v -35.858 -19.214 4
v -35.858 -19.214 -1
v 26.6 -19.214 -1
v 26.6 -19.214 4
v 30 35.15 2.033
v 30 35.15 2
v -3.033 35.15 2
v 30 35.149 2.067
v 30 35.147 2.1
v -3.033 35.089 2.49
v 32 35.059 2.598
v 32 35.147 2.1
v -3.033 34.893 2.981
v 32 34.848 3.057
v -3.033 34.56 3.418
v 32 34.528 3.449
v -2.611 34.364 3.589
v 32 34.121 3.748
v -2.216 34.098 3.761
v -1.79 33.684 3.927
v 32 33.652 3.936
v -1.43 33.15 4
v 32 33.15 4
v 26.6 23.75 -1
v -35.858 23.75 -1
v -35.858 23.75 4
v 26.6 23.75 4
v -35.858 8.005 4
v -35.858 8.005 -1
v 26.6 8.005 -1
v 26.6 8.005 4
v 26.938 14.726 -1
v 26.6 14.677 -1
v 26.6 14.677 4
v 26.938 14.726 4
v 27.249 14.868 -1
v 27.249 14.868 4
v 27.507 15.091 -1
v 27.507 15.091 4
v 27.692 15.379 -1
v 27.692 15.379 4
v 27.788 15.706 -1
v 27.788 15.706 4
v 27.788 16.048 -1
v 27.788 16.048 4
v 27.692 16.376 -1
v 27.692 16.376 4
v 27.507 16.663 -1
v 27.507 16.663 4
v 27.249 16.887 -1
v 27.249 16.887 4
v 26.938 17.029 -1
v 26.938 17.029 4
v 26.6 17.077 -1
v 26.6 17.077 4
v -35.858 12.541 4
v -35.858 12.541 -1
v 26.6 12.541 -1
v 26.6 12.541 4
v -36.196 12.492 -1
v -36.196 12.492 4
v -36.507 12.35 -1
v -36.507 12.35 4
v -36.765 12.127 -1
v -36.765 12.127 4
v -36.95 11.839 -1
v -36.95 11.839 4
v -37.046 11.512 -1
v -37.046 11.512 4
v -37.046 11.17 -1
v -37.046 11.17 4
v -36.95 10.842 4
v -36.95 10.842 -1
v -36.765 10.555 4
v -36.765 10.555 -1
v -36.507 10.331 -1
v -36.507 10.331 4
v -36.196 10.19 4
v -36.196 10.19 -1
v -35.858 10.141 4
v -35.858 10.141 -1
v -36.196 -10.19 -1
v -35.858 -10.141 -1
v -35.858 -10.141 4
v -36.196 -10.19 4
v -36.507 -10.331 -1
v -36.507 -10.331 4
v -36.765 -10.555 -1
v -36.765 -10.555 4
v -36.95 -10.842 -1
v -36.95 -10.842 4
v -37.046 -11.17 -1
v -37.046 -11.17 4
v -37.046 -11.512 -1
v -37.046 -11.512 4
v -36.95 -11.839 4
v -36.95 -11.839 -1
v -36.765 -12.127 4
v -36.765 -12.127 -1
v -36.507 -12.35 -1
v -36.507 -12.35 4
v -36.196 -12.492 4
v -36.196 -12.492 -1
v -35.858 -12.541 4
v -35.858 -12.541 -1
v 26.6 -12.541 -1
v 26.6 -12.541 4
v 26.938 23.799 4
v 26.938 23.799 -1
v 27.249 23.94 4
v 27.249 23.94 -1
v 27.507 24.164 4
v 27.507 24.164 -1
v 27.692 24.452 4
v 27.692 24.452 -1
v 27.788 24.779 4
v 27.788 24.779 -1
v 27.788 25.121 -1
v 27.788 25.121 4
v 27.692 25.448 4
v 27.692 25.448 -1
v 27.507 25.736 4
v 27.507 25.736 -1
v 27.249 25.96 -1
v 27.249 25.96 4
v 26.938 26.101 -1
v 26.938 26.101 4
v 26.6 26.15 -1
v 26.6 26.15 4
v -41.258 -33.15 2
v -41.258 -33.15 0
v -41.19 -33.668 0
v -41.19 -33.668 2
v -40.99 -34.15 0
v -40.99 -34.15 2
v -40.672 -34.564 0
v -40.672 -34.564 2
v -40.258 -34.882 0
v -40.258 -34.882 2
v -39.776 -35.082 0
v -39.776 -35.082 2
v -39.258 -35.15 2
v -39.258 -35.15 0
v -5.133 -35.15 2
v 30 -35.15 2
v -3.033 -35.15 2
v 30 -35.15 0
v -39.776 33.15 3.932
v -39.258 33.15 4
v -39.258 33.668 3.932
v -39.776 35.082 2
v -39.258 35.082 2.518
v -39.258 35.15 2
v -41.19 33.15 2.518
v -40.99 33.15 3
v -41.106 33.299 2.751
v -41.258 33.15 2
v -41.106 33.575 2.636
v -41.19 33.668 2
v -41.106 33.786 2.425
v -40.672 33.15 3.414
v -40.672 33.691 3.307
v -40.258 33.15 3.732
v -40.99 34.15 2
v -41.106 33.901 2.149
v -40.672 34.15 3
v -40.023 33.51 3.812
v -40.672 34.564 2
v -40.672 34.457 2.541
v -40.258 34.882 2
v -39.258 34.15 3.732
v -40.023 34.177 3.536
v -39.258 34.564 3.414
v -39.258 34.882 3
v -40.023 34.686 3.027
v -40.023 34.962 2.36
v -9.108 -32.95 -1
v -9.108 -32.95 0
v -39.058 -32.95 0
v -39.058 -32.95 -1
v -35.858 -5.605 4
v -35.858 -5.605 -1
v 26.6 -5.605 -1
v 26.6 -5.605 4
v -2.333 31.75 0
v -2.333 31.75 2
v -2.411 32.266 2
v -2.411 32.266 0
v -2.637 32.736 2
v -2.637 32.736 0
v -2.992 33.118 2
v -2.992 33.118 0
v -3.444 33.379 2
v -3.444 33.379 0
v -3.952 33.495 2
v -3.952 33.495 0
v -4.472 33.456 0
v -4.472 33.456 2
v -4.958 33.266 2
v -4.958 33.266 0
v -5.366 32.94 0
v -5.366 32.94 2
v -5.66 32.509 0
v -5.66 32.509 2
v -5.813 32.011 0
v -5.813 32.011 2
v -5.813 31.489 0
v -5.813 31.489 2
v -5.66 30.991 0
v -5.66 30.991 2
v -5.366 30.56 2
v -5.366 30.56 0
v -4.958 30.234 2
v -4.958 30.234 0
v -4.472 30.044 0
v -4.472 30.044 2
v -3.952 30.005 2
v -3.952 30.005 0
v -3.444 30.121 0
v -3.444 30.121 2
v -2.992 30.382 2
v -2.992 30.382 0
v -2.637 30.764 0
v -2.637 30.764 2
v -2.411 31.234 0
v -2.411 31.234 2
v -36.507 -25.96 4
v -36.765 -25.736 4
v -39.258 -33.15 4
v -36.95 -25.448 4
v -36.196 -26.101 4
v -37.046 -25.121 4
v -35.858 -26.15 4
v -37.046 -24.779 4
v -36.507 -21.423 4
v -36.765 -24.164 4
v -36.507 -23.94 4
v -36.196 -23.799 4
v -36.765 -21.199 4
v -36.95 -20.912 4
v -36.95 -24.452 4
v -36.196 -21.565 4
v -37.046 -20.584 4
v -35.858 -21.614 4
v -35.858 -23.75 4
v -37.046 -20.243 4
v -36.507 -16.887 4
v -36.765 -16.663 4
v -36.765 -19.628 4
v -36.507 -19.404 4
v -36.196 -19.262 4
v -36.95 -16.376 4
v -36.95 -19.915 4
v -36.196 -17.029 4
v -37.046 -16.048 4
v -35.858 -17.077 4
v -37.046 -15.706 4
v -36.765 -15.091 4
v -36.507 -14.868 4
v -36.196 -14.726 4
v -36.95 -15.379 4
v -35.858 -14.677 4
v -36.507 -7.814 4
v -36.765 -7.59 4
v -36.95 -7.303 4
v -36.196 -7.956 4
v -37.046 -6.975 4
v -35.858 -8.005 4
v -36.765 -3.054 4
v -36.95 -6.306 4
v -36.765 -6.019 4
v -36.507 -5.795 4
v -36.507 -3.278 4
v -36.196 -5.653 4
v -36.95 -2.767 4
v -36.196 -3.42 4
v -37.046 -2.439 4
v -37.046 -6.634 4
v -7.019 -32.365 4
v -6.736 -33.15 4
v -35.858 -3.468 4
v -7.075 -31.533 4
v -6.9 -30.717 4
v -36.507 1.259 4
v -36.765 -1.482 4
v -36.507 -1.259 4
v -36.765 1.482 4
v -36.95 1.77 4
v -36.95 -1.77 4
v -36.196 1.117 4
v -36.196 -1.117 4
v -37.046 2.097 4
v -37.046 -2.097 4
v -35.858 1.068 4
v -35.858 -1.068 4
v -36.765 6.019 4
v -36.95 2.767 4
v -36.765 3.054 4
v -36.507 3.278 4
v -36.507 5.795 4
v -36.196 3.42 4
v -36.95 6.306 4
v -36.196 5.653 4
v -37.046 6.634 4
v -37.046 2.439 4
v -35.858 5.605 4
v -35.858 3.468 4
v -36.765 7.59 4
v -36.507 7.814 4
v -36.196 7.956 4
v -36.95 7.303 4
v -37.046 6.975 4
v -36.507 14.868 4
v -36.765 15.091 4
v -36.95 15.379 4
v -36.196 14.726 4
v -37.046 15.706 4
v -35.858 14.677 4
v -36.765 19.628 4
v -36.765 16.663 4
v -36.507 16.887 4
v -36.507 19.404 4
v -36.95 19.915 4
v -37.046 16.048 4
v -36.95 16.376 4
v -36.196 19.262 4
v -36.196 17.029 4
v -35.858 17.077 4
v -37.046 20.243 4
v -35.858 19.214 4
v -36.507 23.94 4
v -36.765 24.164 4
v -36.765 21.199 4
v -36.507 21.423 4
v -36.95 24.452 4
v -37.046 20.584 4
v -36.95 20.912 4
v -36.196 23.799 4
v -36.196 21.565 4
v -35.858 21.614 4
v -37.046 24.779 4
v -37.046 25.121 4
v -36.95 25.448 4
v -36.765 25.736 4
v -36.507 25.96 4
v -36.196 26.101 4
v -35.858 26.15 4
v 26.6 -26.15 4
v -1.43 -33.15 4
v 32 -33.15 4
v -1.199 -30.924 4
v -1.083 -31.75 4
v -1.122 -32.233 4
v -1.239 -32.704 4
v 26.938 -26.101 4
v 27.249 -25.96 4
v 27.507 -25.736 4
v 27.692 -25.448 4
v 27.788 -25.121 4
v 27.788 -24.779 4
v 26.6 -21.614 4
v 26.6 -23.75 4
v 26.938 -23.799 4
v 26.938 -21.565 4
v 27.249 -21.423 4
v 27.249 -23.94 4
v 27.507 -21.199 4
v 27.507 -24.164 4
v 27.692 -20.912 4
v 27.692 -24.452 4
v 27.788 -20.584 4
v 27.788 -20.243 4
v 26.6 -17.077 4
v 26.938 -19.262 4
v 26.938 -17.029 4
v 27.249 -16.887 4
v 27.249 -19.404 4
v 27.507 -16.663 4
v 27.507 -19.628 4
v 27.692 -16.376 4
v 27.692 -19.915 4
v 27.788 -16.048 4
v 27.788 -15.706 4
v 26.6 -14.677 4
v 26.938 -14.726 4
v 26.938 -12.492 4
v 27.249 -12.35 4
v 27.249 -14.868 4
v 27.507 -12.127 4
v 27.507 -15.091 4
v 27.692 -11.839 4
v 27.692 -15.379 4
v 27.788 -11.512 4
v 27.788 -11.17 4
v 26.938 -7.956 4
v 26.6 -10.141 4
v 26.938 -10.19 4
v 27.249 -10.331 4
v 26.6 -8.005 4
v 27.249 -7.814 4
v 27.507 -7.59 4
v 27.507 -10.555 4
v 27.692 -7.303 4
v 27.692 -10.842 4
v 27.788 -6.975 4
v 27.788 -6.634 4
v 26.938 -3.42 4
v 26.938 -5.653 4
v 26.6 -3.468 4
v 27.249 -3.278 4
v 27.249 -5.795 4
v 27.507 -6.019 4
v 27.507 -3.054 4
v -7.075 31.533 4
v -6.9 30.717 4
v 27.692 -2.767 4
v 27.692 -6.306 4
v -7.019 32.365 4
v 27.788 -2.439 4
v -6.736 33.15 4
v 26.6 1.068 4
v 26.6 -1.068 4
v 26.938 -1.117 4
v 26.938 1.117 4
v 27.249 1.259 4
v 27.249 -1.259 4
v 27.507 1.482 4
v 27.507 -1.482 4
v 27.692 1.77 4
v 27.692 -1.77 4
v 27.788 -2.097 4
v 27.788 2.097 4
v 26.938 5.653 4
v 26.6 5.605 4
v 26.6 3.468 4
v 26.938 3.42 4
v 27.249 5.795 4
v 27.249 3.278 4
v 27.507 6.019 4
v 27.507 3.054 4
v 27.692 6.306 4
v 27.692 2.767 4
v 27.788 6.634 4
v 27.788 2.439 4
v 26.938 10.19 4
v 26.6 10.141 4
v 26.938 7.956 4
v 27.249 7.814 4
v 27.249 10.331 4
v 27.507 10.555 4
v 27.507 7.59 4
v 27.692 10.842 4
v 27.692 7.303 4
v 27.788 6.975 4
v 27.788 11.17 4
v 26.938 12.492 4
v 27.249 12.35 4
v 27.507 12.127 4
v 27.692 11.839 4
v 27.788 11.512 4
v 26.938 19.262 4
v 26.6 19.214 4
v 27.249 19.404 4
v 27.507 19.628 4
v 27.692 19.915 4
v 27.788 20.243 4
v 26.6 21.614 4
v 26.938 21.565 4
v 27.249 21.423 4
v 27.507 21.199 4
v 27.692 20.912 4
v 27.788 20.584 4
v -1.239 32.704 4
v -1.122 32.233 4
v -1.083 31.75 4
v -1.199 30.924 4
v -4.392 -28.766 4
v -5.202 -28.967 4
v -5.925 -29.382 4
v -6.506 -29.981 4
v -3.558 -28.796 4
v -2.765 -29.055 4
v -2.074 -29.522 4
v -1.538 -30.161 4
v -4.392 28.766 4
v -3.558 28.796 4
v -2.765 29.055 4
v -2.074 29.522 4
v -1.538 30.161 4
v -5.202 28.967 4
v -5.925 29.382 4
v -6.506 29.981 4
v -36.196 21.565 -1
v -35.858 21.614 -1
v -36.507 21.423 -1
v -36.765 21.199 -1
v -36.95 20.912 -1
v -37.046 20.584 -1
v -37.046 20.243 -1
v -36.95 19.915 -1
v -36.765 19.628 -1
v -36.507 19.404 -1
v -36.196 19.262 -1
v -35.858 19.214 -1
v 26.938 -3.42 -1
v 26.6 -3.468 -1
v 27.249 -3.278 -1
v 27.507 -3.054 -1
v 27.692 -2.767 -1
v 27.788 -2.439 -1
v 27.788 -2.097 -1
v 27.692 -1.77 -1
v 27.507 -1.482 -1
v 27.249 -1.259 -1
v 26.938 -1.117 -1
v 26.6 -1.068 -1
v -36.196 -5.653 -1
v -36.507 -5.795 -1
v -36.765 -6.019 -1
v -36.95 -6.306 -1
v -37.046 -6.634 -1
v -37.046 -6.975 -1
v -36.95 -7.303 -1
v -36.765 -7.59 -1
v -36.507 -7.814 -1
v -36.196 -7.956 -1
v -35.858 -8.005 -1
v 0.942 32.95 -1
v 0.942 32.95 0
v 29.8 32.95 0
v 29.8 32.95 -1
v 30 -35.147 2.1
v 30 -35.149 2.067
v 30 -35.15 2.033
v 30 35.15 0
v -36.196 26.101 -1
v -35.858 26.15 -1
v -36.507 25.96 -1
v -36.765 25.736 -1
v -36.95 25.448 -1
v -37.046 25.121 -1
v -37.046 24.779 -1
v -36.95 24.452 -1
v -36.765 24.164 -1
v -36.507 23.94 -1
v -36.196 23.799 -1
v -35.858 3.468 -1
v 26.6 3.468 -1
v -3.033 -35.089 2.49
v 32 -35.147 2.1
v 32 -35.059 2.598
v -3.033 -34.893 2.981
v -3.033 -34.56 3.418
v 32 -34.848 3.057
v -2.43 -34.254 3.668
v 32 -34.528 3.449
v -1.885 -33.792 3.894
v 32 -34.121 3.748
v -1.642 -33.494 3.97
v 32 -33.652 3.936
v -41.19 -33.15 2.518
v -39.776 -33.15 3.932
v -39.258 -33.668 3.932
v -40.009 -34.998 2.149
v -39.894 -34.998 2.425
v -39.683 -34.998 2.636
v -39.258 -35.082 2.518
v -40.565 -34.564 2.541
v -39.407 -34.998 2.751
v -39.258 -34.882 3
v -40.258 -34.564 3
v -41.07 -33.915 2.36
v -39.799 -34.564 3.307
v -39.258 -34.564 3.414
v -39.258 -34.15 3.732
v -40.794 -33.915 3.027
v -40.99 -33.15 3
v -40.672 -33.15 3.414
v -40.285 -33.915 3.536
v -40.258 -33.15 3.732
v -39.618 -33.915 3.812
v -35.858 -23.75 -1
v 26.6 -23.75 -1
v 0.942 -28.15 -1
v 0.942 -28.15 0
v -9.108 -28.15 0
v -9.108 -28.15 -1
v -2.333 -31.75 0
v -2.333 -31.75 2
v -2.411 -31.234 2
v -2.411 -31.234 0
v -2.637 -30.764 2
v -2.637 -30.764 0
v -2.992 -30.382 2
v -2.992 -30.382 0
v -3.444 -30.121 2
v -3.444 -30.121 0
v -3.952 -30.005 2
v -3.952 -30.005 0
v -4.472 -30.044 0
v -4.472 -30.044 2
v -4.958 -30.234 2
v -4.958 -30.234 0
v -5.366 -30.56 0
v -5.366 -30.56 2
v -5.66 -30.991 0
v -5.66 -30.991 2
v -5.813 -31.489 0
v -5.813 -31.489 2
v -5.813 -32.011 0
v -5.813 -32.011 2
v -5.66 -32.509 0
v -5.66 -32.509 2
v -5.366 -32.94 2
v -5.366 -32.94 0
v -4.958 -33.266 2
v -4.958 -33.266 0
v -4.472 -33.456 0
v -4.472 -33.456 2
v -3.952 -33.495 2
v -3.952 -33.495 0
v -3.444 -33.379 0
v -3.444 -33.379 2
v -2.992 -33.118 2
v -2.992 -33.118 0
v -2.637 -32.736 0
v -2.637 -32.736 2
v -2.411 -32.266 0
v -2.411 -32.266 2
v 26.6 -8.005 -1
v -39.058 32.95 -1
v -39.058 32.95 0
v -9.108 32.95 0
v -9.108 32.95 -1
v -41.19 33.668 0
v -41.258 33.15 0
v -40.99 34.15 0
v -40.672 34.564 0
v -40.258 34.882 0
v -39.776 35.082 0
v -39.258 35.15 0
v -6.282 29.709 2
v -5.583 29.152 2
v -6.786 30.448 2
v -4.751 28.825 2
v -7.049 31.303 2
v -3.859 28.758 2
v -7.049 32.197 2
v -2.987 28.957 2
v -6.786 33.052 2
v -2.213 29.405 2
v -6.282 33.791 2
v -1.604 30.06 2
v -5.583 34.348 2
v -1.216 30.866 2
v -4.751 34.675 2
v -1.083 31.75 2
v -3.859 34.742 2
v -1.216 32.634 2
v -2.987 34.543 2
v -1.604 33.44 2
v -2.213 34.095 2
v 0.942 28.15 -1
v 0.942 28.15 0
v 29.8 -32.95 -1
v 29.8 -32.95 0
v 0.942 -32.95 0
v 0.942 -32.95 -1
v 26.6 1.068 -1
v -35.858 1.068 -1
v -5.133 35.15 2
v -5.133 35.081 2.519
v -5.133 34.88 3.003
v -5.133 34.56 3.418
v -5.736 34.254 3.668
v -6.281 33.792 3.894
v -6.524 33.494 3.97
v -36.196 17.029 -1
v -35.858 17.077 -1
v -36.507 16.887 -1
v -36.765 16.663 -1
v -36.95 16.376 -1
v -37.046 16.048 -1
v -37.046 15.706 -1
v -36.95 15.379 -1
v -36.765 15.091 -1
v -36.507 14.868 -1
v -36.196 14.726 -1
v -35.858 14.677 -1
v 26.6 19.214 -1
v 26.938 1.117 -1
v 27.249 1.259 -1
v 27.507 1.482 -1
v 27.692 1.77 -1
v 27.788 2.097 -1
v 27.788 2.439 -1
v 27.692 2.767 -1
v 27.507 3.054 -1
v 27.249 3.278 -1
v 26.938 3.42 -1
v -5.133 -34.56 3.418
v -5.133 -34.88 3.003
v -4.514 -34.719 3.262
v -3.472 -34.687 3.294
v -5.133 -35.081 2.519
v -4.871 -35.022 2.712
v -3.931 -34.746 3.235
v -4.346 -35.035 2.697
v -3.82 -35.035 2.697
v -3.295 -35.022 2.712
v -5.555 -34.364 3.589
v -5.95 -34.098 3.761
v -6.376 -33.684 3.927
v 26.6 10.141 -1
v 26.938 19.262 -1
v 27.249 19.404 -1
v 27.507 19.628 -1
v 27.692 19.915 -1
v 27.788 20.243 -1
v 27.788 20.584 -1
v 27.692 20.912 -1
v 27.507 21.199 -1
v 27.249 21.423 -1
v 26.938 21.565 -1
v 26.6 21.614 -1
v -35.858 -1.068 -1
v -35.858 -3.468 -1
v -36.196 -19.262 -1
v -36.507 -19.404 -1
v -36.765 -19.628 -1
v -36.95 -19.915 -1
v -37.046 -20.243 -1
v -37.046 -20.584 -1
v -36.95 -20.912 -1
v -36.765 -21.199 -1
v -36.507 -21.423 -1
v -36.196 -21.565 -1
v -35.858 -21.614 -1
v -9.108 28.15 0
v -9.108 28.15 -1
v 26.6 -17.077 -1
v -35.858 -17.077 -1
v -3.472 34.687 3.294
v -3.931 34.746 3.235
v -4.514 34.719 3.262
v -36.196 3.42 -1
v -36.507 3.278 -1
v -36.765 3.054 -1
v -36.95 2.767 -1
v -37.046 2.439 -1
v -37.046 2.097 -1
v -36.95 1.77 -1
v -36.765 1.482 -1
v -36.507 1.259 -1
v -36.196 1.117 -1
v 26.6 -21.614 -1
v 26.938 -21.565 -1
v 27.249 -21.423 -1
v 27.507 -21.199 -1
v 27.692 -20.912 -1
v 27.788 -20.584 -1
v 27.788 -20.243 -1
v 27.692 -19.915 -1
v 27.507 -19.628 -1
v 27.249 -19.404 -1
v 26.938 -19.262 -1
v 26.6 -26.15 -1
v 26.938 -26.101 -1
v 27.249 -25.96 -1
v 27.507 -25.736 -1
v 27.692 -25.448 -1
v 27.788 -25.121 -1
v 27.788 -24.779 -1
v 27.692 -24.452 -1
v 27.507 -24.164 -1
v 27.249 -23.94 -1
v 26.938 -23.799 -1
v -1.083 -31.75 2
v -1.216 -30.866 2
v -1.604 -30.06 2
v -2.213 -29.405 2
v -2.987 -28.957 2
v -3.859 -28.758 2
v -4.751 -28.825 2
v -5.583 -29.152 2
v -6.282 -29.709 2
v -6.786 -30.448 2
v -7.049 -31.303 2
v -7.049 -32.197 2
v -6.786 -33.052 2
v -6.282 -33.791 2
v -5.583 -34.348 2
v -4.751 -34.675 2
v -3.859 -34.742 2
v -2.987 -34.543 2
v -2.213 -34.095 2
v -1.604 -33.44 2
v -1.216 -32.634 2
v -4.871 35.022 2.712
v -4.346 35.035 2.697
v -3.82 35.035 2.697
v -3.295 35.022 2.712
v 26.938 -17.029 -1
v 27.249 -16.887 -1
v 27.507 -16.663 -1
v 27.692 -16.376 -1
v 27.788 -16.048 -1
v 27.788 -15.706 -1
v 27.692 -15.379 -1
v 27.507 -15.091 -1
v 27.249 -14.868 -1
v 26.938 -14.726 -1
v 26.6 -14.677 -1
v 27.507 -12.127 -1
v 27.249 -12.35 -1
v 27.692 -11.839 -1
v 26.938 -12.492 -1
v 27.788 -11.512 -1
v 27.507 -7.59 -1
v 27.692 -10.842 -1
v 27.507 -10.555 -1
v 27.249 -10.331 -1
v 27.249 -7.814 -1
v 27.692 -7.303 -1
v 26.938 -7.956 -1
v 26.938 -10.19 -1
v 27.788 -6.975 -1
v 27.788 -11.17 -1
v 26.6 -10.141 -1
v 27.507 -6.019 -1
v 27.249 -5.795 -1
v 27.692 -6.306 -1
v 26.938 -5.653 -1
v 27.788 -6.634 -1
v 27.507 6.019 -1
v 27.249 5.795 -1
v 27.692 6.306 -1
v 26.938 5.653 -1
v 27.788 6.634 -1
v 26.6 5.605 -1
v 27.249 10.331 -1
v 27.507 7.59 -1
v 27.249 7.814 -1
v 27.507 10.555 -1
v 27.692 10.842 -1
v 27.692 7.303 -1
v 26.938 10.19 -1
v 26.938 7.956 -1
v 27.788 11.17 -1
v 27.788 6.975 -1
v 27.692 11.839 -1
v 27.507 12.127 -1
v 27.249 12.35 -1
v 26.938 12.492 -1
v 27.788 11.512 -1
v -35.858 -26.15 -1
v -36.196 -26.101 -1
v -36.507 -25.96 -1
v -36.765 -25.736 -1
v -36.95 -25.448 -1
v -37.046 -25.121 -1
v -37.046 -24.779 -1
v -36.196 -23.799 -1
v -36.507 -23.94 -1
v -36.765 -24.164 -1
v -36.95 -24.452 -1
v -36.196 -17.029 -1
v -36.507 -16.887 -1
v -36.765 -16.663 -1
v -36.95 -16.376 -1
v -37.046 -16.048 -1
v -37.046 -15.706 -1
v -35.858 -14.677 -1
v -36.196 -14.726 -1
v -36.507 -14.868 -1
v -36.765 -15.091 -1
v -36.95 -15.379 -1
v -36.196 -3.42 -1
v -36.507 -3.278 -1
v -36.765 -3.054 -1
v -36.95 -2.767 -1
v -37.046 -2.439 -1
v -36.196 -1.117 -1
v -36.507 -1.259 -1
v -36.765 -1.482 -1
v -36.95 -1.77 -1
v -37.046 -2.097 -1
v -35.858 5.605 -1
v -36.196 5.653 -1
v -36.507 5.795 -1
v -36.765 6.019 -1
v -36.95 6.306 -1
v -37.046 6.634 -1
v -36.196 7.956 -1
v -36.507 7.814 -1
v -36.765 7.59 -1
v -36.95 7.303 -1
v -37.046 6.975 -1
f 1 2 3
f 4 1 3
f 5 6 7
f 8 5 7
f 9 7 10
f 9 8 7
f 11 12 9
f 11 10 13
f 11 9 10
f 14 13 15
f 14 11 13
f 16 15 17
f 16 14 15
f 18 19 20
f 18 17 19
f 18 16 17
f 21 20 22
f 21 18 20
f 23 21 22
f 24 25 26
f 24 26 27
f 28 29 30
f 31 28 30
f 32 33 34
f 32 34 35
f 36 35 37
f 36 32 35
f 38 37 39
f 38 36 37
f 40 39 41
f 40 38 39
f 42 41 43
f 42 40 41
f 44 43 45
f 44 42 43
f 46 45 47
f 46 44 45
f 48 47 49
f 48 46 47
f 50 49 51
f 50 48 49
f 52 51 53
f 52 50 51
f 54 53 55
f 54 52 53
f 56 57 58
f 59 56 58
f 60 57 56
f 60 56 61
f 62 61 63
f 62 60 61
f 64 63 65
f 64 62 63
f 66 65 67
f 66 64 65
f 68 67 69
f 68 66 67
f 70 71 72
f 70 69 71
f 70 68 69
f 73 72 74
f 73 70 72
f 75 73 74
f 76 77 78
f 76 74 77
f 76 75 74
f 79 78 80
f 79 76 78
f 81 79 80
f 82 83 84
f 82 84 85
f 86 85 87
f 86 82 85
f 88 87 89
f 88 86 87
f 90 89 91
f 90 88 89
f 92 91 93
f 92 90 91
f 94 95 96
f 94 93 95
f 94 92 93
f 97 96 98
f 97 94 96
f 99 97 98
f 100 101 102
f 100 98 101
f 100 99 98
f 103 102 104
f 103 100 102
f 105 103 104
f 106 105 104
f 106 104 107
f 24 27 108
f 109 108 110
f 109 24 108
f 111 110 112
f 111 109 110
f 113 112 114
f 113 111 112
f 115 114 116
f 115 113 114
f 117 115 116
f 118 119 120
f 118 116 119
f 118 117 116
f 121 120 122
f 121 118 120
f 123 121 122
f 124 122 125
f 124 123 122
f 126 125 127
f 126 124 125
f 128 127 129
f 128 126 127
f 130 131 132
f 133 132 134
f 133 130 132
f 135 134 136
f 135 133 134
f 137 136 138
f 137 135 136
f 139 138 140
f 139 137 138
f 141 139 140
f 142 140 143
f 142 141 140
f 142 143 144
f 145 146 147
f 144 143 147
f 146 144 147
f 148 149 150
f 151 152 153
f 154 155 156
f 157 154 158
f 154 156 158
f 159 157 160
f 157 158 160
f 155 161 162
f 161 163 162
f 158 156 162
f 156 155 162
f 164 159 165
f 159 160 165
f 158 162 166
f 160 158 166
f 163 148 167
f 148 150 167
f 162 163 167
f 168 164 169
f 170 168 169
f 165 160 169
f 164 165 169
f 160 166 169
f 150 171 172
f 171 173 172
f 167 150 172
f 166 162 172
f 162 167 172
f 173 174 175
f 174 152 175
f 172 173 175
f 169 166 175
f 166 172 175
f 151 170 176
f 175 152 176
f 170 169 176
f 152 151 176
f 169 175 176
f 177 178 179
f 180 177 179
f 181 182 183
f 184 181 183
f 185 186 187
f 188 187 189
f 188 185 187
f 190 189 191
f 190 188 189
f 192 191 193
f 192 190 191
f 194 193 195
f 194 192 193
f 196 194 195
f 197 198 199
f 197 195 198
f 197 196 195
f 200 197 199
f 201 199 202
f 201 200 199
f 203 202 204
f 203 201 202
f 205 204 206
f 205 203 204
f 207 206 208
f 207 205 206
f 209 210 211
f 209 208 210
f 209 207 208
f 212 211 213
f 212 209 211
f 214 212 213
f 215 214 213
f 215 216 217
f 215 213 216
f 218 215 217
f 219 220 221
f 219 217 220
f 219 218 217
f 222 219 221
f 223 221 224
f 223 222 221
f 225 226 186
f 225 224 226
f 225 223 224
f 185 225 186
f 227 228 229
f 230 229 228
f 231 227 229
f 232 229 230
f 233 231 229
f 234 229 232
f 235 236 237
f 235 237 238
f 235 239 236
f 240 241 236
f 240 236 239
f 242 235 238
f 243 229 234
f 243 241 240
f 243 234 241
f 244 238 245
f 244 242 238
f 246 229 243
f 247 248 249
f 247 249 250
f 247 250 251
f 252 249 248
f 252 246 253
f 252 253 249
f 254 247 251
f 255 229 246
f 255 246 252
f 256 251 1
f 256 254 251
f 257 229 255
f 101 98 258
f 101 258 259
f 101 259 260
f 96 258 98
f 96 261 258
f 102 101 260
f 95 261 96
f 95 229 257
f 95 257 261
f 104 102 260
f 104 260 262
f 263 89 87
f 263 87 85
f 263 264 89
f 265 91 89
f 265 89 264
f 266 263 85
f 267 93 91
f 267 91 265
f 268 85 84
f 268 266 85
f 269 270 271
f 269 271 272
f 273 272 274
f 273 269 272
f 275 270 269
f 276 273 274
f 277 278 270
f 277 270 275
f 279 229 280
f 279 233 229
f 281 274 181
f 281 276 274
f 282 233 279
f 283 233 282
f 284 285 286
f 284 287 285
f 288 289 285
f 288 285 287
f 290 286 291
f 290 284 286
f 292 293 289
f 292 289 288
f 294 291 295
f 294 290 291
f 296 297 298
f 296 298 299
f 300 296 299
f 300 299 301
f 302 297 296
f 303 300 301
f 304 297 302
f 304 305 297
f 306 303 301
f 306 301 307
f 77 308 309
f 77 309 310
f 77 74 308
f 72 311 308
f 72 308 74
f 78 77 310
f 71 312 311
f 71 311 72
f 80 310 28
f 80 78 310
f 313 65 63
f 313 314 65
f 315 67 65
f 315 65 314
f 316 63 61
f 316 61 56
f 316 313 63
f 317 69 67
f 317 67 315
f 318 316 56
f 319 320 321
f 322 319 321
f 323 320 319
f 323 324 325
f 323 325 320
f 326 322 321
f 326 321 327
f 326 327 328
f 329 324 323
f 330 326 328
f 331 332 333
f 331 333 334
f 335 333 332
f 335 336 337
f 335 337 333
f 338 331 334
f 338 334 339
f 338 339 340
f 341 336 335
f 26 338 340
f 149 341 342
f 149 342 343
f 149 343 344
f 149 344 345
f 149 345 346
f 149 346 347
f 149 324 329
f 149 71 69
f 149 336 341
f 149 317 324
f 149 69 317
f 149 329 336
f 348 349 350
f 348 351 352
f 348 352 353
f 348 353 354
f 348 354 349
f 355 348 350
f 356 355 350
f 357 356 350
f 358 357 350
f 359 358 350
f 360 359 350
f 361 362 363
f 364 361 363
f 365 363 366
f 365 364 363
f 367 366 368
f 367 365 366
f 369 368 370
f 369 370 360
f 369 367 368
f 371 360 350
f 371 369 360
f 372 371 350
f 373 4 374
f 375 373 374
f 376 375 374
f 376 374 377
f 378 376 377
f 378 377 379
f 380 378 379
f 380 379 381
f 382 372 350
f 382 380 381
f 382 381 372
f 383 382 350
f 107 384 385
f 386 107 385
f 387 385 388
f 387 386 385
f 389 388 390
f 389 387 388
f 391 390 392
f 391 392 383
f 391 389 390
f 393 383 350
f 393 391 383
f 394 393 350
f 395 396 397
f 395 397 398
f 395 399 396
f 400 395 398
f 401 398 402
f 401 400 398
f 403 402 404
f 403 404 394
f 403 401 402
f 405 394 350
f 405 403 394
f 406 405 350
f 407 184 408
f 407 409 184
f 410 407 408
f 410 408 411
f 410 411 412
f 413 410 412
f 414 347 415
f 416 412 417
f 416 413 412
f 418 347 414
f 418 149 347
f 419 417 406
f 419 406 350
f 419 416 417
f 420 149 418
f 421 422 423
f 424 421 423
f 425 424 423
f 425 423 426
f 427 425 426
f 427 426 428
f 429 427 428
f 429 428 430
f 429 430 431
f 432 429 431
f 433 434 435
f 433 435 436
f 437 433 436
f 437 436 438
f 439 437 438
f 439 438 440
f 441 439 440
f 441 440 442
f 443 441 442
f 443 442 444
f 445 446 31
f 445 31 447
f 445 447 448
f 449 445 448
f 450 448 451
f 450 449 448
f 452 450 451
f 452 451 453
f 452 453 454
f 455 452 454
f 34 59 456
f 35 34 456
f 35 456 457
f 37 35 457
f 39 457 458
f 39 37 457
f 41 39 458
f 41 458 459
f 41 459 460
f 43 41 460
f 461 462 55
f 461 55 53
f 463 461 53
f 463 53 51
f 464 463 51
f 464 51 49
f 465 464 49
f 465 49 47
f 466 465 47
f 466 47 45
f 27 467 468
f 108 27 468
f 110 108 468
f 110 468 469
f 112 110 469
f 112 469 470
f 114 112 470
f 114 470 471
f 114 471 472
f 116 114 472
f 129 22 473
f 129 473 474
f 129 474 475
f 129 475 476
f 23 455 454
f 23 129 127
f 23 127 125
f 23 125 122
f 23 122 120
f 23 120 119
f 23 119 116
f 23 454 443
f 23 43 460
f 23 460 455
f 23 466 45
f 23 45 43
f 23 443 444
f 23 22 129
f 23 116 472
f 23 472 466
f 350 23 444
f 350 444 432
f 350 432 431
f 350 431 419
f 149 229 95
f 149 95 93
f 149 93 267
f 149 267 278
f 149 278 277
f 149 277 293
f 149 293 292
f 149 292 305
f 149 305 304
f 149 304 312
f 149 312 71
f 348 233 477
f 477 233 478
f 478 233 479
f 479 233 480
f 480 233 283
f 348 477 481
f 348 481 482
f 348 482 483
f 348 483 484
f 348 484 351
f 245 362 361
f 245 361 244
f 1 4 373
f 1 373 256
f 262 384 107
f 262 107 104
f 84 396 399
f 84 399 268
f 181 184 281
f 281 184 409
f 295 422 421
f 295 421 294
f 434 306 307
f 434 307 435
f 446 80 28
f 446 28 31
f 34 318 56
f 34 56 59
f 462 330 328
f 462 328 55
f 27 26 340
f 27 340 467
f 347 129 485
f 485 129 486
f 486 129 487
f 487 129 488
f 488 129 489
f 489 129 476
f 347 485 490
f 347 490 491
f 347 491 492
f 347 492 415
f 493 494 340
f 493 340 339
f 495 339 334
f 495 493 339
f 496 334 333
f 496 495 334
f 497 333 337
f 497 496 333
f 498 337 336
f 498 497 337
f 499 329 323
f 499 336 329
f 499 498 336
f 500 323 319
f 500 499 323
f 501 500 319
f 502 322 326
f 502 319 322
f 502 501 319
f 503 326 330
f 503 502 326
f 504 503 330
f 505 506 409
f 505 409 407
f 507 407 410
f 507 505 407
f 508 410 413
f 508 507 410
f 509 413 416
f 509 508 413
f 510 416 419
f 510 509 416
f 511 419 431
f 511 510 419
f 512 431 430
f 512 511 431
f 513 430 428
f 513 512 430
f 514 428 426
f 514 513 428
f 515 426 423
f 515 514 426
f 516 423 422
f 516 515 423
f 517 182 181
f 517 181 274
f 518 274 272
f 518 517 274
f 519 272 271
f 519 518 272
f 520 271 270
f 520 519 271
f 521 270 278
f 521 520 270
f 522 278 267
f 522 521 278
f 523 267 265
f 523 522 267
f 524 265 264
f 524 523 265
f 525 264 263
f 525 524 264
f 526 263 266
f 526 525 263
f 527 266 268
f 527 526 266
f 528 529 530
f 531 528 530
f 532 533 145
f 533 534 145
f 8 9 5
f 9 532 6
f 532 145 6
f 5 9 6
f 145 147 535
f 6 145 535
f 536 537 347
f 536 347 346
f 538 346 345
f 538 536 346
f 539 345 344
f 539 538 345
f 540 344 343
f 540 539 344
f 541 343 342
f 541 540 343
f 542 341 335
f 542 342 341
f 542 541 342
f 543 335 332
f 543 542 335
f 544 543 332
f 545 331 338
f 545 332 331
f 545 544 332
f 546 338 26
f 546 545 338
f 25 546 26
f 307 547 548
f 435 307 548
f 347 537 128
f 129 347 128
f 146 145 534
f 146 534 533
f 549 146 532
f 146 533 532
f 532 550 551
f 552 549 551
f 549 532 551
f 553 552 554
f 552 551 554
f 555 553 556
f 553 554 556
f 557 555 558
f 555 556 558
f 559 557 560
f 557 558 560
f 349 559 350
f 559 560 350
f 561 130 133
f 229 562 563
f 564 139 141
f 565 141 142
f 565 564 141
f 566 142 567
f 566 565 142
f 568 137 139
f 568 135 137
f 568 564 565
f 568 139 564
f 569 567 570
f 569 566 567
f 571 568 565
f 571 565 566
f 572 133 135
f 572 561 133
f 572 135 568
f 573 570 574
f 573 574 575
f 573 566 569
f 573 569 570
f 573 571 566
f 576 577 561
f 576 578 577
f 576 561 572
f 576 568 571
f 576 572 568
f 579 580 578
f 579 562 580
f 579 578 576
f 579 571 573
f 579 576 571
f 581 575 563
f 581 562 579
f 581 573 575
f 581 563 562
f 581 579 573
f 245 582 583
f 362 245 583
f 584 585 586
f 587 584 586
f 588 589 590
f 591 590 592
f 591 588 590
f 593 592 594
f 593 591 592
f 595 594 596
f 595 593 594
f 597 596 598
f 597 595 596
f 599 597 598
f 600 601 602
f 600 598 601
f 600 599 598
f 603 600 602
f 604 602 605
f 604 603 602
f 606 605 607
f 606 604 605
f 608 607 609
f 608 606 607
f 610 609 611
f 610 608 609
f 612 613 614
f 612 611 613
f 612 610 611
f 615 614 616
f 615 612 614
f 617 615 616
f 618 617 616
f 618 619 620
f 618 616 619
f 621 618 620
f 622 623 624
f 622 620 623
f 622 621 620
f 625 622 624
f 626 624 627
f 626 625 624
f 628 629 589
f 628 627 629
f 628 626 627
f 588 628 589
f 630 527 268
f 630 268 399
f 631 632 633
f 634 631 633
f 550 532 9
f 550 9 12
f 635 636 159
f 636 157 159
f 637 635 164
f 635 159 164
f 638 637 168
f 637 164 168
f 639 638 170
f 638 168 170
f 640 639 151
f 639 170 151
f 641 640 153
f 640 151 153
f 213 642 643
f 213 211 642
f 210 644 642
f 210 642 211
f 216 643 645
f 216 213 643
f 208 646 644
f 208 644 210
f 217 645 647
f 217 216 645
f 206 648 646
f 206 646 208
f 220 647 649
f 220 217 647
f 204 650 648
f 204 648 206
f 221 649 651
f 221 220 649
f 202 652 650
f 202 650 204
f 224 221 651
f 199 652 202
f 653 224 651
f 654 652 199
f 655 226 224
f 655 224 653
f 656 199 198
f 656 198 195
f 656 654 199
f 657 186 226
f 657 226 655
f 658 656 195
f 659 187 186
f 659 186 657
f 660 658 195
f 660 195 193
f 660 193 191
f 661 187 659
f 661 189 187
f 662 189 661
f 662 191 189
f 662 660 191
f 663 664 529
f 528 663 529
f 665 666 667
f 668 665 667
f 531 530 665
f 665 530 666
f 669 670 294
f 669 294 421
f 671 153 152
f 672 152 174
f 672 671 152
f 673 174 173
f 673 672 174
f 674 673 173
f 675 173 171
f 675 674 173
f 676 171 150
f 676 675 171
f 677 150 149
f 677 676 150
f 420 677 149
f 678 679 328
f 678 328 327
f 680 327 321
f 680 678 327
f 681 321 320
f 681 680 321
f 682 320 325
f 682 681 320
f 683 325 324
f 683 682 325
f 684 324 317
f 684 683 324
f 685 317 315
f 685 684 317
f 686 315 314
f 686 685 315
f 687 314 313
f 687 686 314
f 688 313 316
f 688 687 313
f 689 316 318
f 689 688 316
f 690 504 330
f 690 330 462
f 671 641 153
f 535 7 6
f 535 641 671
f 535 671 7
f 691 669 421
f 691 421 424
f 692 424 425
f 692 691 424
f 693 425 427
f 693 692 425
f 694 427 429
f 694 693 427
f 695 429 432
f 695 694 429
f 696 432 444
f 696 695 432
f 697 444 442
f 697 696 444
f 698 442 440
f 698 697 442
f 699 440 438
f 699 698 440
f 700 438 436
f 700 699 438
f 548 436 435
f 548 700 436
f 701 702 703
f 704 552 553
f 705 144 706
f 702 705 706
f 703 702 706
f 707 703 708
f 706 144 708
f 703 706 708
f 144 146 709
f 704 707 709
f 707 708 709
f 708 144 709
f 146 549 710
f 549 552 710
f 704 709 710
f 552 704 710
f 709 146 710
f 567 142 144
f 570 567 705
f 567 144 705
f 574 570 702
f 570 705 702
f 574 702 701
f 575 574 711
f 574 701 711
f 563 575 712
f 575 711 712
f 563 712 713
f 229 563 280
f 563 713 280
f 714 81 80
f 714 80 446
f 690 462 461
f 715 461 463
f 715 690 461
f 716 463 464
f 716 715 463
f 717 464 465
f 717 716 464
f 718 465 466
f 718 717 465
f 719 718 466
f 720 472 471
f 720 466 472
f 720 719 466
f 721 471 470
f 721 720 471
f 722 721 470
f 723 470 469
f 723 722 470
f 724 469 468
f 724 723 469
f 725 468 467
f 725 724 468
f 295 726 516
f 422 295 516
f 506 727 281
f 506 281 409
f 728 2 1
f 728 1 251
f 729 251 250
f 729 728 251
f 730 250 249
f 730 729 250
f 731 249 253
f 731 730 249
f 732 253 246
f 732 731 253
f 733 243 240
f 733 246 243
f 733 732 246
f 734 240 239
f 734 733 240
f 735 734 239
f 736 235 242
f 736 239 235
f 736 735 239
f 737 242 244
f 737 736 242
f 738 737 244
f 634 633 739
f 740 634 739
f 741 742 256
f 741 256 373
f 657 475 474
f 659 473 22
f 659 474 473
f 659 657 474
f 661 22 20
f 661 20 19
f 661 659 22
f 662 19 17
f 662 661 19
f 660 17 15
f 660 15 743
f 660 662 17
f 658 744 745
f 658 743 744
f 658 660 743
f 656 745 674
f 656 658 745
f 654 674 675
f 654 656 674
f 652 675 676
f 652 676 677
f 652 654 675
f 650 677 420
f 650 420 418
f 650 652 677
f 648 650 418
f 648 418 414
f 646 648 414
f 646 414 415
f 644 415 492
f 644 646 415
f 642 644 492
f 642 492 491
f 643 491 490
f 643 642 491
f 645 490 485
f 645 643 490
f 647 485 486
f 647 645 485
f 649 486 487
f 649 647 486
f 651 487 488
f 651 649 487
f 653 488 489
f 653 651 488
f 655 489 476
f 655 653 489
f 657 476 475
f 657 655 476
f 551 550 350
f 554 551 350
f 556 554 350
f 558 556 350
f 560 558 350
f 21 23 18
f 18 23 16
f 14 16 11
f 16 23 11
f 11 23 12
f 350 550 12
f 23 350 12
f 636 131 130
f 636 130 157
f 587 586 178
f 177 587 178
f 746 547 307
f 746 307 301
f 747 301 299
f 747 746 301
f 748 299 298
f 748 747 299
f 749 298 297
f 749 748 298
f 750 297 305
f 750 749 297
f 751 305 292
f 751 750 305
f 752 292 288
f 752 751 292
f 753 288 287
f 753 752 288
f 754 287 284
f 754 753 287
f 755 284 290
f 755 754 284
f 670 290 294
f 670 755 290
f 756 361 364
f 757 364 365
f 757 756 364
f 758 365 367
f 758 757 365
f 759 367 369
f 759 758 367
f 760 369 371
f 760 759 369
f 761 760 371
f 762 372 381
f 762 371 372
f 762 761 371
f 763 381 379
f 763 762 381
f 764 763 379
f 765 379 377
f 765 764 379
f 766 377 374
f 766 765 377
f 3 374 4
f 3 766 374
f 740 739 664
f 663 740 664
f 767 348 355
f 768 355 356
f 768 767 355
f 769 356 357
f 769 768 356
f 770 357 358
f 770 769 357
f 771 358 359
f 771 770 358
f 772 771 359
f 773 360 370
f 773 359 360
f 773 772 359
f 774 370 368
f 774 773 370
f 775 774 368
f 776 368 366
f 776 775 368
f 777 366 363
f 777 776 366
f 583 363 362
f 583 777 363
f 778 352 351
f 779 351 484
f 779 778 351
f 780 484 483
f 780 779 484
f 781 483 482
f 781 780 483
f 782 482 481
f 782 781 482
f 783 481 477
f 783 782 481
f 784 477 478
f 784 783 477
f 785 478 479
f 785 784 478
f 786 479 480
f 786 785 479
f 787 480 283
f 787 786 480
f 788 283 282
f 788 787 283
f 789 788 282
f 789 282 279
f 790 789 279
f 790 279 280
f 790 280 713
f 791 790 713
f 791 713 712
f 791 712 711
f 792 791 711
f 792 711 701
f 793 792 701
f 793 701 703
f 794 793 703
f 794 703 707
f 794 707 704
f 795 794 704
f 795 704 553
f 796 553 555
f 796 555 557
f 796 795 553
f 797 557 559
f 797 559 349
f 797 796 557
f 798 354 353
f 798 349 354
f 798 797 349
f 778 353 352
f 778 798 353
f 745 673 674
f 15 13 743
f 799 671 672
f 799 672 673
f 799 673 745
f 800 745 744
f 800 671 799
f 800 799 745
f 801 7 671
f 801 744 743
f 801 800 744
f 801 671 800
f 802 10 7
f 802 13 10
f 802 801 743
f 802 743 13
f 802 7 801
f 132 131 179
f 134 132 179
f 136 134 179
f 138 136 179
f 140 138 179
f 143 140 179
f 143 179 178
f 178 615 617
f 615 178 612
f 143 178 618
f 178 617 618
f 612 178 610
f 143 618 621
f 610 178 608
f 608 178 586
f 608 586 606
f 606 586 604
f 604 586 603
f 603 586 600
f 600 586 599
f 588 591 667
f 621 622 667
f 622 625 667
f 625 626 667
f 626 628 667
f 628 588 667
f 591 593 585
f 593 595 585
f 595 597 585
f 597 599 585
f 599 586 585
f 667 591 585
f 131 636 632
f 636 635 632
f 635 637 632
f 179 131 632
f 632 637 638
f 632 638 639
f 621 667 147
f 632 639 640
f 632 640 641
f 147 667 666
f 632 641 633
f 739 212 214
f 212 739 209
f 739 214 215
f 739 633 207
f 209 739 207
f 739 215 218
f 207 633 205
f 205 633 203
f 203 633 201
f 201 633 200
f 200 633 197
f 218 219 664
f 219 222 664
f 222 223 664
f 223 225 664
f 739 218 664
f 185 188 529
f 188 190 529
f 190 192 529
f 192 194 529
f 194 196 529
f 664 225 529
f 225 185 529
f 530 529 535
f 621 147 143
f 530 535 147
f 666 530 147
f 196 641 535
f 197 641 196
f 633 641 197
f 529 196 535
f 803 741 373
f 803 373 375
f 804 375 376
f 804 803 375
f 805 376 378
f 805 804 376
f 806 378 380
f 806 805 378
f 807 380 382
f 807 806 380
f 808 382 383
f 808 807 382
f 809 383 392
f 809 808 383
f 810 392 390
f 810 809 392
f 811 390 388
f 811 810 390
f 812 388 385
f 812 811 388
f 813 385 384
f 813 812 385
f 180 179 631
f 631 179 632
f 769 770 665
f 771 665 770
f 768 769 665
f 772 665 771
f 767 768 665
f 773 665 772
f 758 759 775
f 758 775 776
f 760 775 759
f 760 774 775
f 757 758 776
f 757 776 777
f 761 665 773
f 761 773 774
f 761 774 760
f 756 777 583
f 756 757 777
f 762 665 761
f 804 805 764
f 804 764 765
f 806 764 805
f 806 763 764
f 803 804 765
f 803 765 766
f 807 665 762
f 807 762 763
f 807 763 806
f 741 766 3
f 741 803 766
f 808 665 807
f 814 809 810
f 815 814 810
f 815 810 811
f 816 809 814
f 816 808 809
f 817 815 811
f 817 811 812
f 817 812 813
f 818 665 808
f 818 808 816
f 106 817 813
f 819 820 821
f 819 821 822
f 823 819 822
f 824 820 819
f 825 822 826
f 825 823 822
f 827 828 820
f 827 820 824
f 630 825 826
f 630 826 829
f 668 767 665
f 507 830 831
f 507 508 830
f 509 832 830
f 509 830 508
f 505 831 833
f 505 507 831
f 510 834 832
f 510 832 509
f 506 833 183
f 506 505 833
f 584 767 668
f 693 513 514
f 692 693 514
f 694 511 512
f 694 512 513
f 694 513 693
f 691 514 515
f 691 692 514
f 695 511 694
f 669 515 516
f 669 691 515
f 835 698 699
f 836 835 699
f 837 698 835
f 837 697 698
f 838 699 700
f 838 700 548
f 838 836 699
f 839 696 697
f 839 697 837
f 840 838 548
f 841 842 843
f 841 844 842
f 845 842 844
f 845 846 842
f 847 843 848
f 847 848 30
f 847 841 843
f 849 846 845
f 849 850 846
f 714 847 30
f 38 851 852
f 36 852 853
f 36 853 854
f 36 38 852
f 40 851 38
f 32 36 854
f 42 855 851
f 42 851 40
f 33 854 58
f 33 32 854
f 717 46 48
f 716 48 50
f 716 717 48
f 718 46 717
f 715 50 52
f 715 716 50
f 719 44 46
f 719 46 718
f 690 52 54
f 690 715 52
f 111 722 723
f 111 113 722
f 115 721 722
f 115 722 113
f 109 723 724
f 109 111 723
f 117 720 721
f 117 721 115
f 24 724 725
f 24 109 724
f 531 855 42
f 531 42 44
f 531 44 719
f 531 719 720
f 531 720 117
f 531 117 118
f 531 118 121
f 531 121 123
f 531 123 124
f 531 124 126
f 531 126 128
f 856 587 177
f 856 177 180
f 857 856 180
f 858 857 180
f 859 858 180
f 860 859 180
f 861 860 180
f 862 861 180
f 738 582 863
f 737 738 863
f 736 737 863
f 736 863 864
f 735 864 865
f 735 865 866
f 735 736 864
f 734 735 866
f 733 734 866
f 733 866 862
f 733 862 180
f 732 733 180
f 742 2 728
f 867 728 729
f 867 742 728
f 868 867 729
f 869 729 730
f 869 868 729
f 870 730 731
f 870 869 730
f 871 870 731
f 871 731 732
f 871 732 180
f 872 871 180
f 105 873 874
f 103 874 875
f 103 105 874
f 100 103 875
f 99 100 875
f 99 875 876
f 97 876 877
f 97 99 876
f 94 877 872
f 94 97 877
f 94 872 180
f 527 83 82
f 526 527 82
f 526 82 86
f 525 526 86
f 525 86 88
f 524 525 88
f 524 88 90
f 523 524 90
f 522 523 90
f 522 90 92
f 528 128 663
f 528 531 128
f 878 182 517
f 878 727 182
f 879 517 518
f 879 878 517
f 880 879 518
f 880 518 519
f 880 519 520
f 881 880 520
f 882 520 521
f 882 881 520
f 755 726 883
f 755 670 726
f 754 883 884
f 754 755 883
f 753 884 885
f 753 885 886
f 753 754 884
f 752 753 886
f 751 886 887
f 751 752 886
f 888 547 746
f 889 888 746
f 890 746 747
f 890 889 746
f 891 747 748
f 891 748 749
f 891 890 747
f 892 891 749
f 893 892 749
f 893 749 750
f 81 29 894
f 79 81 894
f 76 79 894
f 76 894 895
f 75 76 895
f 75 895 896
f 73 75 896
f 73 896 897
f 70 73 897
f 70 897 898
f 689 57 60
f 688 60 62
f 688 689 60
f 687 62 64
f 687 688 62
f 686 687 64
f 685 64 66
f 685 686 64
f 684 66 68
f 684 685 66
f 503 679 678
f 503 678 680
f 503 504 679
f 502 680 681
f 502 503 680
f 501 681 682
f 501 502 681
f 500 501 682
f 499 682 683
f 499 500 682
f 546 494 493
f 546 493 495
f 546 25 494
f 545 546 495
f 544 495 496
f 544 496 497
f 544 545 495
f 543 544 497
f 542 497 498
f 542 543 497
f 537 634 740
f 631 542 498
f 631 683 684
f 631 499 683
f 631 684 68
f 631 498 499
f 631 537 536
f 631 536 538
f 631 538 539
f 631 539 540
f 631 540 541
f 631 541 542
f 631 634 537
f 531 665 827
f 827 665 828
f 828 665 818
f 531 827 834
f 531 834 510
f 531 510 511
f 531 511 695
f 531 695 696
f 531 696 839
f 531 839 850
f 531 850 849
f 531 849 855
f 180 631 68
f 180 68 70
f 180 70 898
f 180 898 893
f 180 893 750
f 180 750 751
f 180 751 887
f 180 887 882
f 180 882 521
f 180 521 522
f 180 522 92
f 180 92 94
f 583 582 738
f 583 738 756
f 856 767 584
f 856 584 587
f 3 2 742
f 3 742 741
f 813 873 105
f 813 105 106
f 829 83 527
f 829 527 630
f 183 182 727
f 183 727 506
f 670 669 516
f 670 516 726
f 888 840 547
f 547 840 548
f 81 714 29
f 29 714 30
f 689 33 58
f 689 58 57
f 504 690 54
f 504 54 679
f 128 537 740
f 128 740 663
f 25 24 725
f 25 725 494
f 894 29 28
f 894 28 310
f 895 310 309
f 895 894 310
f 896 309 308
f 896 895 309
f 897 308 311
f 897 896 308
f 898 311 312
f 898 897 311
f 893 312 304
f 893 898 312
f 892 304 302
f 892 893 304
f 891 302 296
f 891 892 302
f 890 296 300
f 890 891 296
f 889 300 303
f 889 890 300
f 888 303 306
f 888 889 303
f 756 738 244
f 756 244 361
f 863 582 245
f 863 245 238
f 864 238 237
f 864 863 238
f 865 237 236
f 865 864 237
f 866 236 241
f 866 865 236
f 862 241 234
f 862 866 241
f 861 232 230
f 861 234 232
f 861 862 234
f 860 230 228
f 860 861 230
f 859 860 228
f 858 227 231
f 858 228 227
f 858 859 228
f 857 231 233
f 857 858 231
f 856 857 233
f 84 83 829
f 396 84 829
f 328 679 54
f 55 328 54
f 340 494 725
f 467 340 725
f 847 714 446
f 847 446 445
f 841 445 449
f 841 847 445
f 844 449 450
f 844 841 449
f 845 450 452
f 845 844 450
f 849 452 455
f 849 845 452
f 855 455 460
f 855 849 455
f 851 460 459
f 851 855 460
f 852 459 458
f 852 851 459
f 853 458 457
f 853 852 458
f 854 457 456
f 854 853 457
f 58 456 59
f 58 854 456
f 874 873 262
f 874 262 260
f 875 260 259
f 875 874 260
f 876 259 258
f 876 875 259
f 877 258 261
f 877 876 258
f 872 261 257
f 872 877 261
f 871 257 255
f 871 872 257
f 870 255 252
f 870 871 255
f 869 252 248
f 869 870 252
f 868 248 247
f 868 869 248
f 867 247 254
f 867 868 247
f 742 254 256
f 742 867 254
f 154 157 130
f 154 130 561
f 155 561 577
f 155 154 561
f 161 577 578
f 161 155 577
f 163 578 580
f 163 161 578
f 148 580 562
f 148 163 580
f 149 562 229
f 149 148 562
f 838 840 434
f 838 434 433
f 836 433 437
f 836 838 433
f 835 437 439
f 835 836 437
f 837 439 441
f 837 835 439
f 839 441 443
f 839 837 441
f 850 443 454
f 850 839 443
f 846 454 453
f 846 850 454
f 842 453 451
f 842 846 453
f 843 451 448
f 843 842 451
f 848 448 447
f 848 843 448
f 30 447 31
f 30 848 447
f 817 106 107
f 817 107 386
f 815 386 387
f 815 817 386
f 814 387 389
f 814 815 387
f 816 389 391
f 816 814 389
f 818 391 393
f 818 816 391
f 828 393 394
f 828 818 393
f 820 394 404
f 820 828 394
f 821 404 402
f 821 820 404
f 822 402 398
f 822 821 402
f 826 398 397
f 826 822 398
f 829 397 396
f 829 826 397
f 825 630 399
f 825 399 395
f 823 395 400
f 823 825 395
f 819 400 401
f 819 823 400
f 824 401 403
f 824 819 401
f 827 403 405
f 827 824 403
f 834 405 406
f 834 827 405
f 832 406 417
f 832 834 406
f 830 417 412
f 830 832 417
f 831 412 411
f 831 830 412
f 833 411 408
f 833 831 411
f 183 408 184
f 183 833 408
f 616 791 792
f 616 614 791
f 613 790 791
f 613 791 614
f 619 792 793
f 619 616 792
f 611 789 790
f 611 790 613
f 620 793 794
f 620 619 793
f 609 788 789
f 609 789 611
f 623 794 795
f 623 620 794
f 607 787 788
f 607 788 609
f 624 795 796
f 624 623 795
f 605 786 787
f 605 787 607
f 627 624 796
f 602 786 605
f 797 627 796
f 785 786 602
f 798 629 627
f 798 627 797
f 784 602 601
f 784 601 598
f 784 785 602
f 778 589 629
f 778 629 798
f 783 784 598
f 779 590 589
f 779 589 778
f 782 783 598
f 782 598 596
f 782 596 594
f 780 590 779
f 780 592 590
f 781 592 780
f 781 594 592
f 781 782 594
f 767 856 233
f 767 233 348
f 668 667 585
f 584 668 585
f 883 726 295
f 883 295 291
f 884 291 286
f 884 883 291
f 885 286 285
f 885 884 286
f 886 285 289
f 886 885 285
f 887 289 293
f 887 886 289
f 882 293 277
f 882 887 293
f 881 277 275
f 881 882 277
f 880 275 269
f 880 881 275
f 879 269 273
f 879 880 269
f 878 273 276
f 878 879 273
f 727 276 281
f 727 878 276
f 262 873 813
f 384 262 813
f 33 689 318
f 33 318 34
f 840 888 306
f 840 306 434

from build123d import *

# Parameters (mm, degrees)
SKETCH141_W          = 73.258
SKETCH141_H          = 70.3
SKETCH141_R          = 1.75
PAD050_DEPTH         = 4
FILLET012_R          = 2
SKETCH142_W          = 2
SKETCH142_H          = 70.3
POCKET059_DEPTH      = 2.1
SKETCH143_R          = 3
POCKET060_DEPTH      = 2.001
PAD051_DEPTH         = 1
POCKET061_DEPTH      = 1.001
POCKET061_DEPTH_BACK = 4.001


with BuildPart() as part:
    # Sketch141 → Pad050 (new body)
    with BuildSketch(Plane.XY):
        with Locations((-4.629, 0)):
            Rectangle(SKETCH141_W, SKETCH141_H)
        with Locations((-4.083, 31.75)):
            Circle(SKETCH141_R, mode=Mode.SUBTRACT)
        with Locations((-4.083, -31.75)):
            Circle(SKETCH141_R, mode=Mode.SUBTRACT)
    extrude(amount=PAD050_DEPTH)

    # Fillet012
    fillet012_edges = [part.edges().sort_by_distance(p)[0] for p in [
        (-4.629, 35.15, 4),
        (-41.258, 0, 4),
        (-41.258, 35.15, 2),
        (-41.258, -35.15, 2),
        (-4.629, -35.15, 4),
    ]]
    fillet(fillet012_edges, radius=FILLET012_R)

    # Sketch142 → Pocket059 (cut)
    with BuildSketch(Plane.XY):
        with Locations((31, 0)):
            Rectangle(SKETCH142_W, SKETCH142_H)
    extrude(amount=POCKET059_DEPTH, mode=Mode.SUBTRACT)

    # Sketch143 → Pocket060 (cut, through all)
    with BuildSketch(Plane.XY.offset(2)):
        with Locations((-4.083, 31.75)):
            Circle(SKETCH143_R)
        with Locations((-4.083, -31.75)):
            Circle(SKETCH143_R)
    extrude(amount=POCKET060_DEPTH, mode=Mode.SUBTRACT)

    # Sketch144 → Pad051 (join)
    with BuildSketch(Plane.XY):
        Polygon((-39.058, 32.95), (-9.108, 32.95), (-9.108, 28.15), (0.942, 28.15), (0.942, 32.95), (29.8, 32.95), (29.8, -32.95), (0.942, -32.95), (0.942, -28.15), (-9.108, -28.15), (-9.108, -32.95), (-39.058, -32.95), align=None)
    extrude(amount=-PAD051_DEPTH)

    # Sketch145 → Pocket061 (cut, two sides)
    with BuildSketch(Plane.XY) as pocket061_sk:
        with BuildLine():
            ThreePointArc((-35.858, 26.15), (-37.058, 24.95), (-35.858, 23.75))
            Line((-35.858, 23.75), (26.6, 23.75))
            ThreePointArc((26.6, 23.75), (27.8, 24.95), (26.6, 26.15))
            Line((-35.858, 26.15), (26.6, 26.15))
        make_face()
        with BuildLine():
            ThreePointArc((-35.858, 21.613636), (-37.058, 20.413636), (-35.858, 19.213636))
            Line((-35.858, 19.213636), (26.6, 19.213636))
            ThreePointArc((26.6, 19.213636), (27.8, 20.413636), (26.6, 21.613636))
            Line((-35.858, 21.613636), (26.6, 21.613636))
        make_face()
        with BuildLine():
            ThreePointArc((-35.858, 17.077273), (-37.058, 15.877273), (-35.858, 14.677273))
            Line((-35.858, 14.677273), (26.6, 14.677273))
            ThreePointArc((26.6, 14.677273), (27.8, 15.877273), (26.6, 17.077273))
            Line((-35.858, 17.077273), (26.6, 17.077273))
        make_face()
        with BuildLine():
            ThreePointArc((-35.858, 12.540909), (-37.058, 11.340909), (-35.858, 10.140909))
            Line((-35.858, 10.140909), (26.6, 10.140909))
            ThreePointArc((26.6, 10.140909), (27.8, 11.340909), (26.6, 12.540909))
            Line((-35.858, 12.540909), (26.6, 12.540909))
        make_face()
        with BuildLine():
            ThreePointArc((-35.858, 8.004545), (-37.058, 6.804545), (-35.858, 5.604545))
            Line((-35.858, 5.604545), (26.6, 5.604545))
            ThreePointArc((26.6, 5.604545), (27.8, 6.804545), (26.6, 8.004545))
            Line((-35.858, 8.004545), (26.6, 8.004545))
        make_face()
        with BuildLine():
            ThreePointArc((-35.858, 3.468182), (-37.058, 2.268182), (-35.858, 1.068182))
            Line((-35.858, 1.068182), (26.6, 1.068182))
            ThreePointArc((26.6, 1.068182), (27.8, 2.268182), (26.6, 3.468182))
            Line((-35.858, 3.468182), (26.6, 3.468182))
        make_face()
        with BuildLine():
            ThreePointArc((-35.858, -1.068182), (-37.058, -2.268182), (-35.858, -3.468182))
            Line((-35.858, -3.468182), (26.6, -3.468182))
            ThreePointArc((26.6, -3.468182), (27.8, -2.268182), (26.6, -1.068182))
            Line((-35.858, -1.068182), (26.6, -1.068182))
        make_face()
        with BuildLine():
            ThreePointArc((-35.858, -5.604545), (-37.058, -6.804545), (-35.858, -8.004545))
            Line((-35.858, -8.004545), (26.6, -8.004545))
            ThreePointArc((26.6, -8.004545), (27.8, -6.804545), (26.6, -5.604545))
            Line((-35.858, -5.604545), (26.6, -5.604545))
        make_face()
        with BuildLine():
            ThreePointArc((-35.858, -10.140909), (-37.058, -11.340909), (-35.858, -12.540909))
            Line((-35.858, -12.540909), (26.6, -12.540909))
            ThreePointArc((26.6, -12.540909), (27.8, -11.340909), (26.6, -10.140909))
            Line((-35.858, -10.140909), (26.6, -10.140909))
        make_face()
        with BuildLine():
            ThreePointArc((-35.858, -14.677273), (-37.058, -15.877273), (-35.858, -17.077273))
            Line((-35.858, -17.077273), (26.6, -17.077273))
            ThreePointArc((26.6, -17.077273), (27.8, -15.877273), (26.6, -14.677273))
            Line((-35.858, -14.677273), (26.6, -14.677273))
        make_face()
        with BuildLine():
            ThreePointArc((-35.858, -19.213636), (-37.058, -20.413636), (-35.858, -21.613636))
            Line((-35.858, -21.613636), (26.6, -21.613636))
            ThreePointArc((26.6, -21.613636), (27.8, -20.413636), (26.6, -19.213636))
            Line((-35.858, -19.213636), (26.6, -19.213636))
        make_face()
        with BuildLine():
            ThreePointArc((-35.858, -23.75), (-37.058, -24.95), (-35.858, -26.15))
            Line((-35.858, -26.15), (26.6, -26.15))
            ThreePointArc((26.6, -26.15), (27.8, -24.95), (26.6, -23.75))
            Line((-35.858, -23.75), (26.6, -23.75))
        make_face()
    extrude(amount=-POCKET061_DEPTH, mode=Mode.SUBTRACT)
    extrude(pocket061_sk.sketch, amount=POCKET061_DEPTH_BACK, mode=Mode.SUBTRACT)


solid = part.part
